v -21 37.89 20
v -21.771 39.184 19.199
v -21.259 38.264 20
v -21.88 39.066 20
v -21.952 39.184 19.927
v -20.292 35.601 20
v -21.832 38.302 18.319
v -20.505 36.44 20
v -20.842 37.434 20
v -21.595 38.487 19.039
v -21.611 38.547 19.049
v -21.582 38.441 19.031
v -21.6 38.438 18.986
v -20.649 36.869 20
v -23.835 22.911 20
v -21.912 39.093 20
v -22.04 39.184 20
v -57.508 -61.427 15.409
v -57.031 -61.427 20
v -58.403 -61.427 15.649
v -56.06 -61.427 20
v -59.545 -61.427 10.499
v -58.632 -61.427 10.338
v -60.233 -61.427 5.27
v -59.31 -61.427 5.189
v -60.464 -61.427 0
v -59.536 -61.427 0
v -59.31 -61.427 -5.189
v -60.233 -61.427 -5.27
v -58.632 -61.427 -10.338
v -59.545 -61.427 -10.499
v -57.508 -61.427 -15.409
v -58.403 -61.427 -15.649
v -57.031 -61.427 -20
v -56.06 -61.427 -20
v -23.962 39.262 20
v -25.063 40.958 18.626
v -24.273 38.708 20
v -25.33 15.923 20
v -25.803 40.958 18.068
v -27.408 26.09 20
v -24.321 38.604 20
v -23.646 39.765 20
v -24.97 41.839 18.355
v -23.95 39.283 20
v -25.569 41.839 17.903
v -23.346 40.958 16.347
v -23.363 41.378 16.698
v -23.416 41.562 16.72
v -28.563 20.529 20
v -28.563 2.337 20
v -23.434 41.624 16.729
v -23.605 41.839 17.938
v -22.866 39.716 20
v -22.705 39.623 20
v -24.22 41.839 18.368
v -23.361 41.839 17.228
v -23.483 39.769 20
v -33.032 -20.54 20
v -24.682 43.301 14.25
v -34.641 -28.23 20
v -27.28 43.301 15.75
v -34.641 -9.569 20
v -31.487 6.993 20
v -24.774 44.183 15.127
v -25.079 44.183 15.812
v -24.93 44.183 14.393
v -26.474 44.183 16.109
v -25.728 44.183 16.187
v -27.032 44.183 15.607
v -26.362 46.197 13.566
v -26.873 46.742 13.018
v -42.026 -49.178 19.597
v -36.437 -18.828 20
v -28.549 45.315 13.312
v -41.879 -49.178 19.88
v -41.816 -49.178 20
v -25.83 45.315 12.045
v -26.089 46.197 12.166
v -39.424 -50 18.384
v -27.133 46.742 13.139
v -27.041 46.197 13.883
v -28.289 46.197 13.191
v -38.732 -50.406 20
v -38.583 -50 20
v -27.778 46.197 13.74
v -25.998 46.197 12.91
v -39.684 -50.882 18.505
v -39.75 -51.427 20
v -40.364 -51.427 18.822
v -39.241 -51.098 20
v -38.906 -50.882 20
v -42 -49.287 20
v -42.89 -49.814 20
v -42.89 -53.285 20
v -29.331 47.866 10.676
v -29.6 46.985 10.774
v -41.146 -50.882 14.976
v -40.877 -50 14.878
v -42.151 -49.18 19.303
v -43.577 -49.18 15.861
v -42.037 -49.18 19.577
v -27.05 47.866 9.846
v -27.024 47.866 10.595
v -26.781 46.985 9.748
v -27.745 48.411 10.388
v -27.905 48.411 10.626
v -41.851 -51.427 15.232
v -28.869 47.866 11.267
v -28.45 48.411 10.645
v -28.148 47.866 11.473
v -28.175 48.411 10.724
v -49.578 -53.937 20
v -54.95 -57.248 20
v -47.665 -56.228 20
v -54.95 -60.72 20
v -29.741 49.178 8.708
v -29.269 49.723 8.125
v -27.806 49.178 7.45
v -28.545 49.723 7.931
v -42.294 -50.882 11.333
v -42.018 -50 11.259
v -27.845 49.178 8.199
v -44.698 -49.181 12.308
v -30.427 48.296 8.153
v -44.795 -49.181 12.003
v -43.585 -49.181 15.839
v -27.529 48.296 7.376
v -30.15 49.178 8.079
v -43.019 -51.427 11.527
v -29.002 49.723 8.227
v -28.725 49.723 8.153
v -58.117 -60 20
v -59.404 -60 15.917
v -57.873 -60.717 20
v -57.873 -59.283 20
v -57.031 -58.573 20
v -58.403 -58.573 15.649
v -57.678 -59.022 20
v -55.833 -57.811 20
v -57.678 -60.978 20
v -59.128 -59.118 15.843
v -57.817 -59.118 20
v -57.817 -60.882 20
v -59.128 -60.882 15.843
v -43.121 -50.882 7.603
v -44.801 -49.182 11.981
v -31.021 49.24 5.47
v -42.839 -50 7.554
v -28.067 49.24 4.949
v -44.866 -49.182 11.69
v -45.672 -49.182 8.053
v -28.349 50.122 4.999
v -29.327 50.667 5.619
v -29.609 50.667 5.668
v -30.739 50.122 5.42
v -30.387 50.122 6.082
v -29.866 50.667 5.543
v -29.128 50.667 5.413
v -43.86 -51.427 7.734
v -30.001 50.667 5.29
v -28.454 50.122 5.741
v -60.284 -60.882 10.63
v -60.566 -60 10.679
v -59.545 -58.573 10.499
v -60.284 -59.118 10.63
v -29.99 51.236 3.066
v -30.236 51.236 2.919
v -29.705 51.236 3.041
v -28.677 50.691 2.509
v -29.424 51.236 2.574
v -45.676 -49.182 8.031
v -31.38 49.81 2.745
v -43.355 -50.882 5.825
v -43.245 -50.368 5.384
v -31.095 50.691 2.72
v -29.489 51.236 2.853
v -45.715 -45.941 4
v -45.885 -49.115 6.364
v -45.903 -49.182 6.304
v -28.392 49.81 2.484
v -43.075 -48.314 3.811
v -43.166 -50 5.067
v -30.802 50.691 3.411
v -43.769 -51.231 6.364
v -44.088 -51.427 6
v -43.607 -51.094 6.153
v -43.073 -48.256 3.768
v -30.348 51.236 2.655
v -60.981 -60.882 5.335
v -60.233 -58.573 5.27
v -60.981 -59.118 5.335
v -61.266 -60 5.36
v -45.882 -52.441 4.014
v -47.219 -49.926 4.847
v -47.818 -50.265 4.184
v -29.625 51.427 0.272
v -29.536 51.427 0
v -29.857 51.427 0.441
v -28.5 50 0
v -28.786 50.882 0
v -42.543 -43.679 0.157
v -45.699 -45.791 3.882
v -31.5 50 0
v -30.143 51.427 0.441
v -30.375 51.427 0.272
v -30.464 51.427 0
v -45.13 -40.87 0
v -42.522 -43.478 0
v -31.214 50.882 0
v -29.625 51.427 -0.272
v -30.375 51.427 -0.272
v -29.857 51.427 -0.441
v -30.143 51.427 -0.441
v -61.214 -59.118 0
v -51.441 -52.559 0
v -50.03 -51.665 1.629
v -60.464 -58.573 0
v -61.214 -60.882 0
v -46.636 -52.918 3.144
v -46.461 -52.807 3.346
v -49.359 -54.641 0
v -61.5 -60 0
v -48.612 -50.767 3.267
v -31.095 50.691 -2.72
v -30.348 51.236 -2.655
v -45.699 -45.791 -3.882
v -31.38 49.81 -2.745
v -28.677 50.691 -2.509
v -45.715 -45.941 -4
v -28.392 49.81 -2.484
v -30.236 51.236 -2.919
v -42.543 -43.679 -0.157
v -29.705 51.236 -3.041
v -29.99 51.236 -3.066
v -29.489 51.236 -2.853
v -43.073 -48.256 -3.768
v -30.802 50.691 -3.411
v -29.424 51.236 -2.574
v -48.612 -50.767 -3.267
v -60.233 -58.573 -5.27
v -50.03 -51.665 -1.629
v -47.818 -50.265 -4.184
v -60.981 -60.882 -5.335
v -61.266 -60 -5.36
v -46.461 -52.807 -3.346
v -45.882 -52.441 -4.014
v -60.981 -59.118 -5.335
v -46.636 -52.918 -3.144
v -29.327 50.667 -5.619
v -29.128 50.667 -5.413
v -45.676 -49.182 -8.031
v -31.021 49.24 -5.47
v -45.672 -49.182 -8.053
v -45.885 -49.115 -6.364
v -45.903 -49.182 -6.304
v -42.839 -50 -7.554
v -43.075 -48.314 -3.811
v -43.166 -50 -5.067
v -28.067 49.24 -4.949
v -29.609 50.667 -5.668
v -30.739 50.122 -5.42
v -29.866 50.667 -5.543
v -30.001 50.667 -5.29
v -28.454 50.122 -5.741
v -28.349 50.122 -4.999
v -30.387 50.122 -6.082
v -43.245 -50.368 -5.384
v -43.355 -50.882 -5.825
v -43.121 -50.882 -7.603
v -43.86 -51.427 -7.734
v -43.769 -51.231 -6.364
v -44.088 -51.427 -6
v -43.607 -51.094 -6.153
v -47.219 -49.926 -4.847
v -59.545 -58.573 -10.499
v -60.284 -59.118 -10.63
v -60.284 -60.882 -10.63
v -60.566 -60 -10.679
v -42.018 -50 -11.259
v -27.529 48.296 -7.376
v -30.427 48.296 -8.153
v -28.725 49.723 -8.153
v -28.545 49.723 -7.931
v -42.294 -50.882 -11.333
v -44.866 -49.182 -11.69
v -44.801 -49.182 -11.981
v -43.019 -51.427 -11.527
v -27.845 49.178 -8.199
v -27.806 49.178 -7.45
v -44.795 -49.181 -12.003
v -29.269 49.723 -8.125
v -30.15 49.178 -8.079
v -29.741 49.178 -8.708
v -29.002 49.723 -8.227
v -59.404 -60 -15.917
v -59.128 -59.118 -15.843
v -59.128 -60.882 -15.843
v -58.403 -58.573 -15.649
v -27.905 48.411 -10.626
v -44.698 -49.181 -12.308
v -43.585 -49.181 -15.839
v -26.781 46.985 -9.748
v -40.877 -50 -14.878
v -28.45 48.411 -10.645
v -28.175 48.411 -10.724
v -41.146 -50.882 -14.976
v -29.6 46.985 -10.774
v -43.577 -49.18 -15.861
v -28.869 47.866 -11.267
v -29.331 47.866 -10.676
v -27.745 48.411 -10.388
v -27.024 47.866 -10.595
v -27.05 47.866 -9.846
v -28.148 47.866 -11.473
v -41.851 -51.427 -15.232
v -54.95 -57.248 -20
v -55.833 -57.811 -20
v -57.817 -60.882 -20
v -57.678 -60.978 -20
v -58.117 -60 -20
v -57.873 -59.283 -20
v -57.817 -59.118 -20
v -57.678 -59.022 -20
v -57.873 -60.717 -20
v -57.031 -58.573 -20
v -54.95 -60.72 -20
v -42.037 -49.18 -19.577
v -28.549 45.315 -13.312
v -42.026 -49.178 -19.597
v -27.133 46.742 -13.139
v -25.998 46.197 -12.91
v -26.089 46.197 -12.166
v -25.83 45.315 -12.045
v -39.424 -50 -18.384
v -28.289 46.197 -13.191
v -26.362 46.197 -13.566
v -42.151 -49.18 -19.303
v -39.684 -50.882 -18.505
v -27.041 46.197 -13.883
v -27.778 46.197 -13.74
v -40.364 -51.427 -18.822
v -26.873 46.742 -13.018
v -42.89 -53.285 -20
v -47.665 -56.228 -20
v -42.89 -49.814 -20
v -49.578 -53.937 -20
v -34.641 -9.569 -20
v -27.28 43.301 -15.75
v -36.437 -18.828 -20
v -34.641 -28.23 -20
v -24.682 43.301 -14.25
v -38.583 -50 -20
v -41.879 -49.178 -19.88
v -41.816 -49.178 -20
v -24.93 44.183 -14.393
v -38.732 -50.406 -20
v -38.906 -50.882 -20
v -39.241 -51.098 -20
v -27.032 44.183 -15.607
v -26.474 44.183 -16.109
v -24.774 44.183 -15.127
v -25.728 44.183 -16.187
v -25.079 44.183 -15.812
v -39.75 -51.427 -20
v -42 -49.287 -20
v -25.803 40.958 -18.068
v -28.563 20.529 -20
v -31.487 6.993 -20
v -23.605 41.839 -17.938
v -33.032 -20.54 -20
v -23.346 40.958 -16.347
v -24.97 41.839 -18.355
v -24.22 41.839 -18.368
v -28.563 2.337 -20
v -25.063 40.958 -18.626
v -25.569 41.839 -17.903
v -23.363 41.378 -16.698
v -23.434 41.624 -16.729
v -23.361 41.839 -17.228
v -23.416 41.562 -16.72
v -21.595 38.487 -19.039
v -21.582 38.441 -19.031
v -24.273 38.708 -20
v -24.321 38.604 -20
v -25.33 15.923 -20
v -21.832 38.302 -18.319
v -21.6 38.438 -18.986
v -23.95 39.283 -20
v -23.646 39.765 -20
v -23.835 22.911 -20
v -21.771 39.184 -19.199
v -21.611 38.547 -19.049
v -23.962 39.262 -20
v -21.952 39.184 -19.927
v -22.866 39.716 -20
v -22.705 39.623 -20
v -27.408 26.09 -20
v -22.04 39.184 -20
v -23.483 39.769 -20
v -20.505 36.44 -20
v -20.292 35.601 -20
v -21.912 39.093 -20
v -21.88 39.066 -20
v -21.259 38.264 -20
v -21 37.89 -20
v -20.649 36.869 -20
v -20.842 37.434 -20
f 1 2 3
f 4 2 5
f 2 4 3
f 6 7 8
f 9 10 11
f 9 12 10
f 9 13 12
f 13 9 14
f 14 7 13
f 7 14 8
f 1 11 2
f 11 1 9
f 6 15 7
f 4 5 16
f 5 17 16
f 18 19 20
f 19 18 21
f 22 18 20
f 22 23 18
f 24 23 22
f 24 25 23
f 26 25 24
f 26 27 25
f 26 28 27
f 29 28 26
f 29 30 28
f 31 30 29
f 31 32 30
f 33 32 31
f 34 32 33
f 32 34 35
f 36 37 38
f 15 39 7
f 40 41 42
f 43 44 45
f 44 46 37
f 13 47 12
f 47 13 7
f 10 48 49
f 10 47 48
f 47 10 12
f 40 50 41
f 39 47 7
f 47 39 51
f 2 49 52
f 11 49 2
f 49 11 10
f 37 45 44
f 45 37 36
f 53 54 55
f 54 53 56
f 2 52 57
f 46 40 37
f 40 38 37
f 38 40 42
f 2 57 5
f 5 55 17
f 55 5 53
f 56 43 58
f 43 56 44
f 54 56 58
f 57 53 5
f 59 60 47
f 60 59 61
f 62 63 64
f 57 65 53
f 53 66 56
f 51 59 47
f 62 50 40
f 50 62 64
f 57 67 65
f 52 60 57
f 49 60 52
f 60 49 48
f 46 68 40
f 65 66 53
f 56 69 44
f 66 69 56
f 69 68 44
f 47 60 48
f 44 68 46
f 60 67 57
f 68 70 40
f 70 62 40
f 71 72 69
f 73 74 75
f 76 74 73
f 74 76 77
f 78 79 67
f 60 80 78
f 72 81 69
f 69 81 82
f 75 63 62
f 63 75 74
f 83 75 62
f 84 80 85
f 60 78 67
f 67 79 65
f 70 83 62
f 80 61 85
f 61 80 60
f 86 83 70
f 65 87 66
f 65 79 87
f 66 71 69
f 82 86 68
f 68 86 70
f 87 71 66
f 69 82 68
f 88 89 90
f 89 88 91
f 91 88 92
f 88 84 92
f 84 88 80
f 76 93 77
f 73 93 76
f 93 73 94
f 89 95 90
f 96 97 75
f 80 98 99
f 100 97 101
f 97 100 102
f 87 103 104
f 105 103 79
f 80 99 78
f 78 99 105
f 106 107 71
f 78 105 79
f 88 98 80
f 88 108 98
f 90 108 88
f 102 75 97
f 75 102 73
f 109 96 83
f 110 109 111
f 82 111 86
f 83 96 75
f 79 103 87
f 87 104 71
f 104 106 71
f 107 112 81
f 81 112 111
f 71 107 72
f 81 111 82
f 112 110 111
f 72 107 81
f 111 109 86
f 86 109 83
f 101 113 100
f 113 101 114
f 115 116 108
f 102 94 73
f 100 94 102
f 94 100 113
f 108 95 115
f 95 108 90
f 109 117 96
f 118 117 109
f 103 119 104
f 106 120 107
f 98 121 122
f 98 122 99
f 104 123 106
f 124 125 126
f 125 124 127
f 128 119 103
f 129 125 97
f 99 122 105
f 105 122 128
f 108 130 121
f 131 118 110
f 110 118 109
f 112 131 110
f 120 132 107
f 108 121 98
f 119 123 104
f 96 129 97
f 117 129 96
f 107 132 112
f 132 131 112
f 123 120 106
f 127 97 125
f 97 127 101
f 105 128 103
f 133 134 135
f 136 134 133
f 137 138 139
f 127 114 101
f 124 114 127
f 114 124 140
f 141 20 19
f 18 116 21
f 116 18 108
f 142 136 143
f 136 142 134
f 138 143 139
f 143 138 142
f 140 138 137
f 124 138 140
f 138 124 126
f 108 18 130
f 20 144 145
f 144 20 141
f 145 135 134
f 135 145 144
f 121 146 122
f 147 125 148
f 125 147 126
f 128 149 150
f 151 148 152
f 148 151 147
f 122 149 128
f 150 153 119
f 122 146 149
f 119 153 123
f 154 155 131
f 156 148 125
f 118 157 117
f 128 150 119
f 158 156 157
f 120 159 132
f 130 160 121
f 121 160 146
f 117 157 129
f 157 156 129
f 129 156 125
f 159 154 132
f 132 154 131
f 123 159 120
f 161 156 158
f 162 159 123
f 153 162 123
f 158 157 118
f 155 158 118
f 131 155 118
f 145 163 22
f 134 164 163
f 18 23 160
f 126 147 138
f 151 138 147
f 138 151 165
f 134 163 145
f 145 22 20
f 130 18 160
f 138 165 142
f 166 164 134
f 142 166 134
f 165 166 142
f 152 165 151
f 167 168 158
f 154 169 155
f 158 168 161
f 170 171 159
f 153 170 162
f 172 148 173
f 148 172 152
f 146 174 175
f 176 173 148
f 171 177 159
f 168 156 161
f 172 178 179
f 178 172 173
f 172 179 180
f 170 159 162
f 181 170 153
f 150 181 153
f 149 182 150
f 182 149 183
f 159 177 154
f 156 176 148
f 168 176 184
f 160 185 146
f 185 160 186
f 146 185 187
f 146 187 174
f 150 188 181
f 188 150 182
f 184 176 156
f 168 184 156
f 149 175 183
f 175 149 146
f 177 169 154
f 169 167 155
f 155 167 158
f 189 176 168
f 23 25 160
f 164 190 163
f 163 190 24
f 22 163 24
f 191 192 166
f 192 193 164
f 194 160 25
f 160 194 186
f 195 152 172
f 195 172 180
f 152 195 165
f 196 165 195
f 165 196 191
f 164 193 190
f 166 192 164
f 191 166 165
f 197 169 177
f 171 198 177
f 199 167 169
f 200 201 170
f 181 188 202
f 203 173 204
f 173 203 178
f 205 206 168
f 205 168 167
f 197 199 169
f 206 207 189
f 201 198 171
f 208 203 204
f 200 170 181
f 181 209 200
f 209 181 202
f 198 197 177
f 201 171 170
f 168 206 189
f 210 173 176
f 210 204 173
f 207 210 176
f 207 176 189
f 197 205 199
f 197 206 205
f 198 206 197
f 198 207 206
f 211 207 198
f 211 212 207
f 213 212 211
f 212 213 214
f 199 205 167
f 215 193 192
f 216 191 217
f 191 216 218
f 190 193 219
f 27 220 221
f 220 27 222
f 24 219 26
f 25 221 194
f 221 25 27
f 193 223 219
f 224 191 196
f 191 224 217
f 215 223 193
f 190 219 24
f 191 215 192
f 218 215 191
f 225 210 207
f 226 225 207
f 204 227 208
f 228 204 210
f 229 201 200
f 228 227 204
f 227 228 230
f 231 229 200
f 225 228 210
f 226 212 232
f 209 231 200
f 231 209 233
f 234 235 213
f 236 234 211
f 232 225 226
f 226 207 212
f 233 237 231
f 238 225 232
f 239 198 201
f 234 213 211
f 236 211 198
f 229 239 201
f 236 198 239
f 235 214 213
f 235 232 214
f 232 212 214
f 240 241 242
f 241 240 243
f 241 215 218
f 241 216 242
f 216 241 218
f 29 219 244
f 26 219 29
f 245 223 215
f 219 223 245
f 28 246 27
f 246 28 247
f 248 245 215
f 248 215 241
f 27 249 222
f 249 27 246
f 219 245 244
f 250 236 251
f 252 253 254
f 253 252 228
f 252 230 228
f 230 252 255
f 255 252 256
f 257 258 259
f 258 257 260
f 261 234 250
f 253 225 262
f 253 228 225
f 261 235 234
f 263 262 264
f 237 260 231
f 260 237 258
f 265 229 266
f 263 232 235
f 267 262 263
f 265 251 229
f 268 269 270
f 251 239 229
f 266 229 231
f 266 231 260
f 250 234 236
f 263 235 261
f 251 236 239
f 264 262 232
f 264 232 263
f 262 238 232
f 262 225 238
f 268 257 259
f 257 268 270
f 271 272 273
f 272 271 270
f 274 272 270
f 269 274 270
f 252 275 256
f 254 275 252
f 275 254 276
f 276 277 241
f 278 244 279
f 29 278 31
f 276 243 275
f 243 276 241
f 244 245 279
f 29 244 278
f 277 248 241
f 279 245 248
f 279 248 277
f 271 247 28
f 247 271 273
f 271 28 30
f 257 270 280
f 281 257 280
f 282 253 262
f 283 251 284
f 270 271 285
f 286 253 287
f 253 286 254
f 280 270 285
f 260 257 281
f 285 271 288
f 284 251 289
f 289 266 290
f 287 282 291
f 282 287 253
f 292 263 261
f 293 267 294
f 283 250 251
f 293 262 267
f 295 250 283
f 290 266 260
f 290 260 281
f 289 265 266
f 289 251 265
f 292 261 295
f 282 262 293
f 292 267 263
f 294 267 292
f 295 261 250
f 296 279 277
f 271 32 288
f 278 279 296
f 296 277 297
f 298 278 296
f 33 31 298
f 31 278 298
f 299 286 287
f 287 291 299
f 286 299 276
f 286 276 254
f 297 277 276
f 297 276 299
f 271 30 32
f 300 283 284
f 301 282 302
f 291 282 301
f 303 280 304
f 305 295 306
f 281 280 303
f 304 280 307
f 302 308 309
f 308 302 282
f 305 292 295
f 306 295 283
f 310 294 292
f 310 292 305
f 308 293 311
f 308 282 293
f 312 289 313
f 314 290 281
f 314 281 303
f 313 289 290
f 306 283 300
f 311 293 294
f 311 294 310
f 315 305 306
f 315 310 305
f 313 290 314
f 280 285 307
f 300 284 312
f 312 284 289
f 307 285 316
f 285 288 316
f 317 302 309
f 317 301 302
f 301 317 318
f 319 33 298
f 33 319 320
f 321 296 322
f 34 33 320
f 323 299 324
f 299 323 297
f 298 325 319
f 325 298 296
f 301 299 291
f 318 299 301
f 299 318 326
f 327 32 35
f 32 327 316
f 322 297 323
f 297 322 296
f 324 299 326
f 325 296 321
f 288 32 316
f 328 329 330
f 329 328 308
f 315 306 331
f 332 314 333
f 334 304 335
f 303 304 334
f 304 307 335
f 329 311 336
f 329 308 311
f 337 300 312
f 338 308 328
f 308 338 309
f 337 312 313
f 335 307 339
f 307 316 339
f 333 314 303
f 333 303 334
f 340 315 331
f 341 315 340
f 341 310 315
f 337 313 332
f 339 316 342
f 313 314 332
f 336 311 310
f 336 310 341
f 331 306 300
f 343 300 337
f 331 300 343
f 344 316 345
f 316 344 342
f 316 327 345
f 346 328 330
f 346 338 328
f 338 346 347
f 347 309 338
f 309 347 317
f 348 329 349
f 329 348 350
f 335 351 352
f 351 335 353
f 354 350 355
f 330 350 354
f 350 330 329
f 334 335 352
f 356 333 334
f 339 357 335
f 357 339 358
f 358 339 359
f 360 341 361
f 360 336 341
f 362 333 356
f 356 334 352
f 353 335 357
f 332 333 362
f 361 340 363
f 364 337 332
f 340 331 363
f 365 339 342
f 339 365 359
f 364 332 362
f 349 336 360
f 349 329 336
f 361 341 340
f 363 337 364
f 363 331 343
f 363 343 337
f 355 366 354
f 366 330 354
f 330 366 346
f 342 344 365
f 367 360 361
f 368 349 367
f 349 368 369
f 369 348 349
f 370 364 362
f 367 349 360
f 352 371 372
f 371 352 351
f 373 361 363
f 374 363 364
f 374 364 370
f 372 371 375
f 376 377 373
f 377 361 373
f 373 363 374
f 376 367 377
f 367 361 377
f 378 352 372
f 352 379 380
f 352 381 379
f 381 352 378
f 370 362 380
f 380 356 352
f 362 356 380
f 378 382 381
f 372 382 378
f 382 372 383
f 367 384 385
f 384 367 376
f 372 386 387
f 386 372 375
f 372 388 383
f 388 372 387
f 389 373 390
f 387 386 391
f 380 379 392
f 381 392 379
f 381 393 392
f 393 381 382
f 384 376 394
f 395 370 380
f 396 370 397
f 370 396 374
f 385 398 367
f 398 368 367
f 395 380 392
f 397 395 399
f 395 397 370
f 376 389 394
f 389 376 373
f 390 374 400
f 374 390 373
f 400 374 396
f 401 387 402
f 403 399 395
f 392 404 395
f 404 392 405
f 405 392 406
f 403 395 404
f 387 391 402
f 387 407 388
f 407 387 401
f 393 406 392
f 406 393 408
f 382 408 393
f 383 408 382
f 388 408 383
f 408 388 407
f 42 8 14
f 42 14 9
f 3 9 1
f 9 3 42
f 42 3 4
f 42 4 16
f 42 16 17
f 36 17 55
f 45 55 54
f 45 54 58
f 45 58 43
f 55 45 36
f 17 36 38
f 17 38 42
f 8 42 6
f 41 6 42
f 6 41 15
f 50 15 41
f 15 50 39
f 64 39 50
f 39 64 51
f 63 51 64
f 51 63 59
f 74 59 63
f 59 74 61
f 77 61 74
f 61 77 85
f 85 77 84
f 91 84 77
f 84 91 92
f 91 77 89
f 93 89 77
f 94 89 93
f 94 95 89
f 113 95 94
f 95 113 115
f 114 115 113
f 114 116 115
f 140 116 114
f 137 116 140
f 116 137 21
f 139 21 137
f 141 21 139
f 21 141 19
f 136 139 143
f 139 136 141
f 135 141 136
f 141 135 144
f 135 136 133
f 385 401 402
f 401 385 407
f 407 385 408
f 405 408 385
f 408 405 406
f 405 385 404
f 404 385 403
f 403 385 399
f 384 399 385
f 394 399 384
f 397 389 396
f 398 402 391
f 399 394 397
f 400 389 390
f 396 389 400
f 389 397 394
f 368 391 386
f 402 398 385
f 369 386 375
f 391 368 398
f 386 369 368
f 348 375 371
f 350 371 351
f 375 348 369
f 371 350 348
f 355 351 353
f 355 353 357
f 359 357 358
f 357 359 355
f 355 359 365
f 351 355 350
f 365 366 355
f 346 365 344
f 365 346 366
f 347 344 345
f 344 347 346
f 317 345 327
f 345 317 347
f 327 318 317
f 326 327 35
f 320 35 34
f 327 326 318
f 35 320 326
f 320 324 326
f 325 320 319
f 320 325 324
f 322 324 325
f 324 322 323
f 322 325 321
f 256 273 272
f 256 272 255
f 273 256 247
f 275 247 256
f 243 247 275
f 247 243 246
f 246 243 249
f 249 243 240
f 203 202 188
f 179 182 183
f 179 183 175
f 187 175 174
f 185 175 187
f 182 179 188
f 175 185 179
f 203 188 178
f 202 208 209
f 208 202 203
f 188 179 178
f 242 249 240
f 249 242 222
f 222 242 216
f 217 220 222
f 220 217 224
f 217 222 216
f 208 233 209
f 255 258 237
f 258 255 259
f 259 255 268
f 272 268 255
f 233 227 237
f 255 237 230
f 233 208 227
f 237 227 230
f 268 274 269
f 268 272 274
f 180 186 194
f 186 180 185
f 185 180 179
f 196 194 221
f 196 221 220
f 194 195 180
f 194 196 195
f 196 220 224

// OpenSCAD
//Length of the shoe horns straight part in mm
height=100; 

//Thickness of the shoe horn in mm
thick=3;

//Diameter of the hole to hang it
holesize=9;

//Radius of the circle for the main curvature at the end of the shoe horn
rad=30;

//Radius multiplier for the middle part of the shoe horn (make it flatter in the middle)
rad_multiplier1=1.5;

//Radius multiplier for the top end (make it even flatter and move it further out)
rad_multiplier2=2;

//How many degree from one face of the curvature to the next (bigger for faster rendering)
angle_step=5;

//Faces for the rounding at the ends of the shoe horn
faces=10;

// preview[view:left, tilt:side]

/* [Hidden] */

/*
Shoe Horn
Version C, November 2014
Written by MC Geisler (mcgenki at gmail dot com)

This is the baby sized version... Customize it to suit a yeti.

Have fun!

License: Attribution-NonCommercial-ShareAlike 4.0 International (CC BY-NC-SA 4.0)
You are free to:
    Share - copy and redistribute the material in any medium or format
    Adapt - remix, transform, and build upon the material
Under the following terms:
    Attribution - You must give appropriate credit, provide a link to the license, and indicate if changes were made. 
    You may do so in any reasonable manner, but not in any way that suggests the licensor endorses you or your use.
    NonCommercial - You may not use the material for commercial purposes.
    ShareAlike - If you remix, transform, or build upon the material, you must distribute your contributions under the same license as the original. 
*/

width=rad*1.4;

module stickballs(rot,low_z,high_z,low_r,high_r,round_low)
{
	rotate([0,0,rot])
		{
			translate([-low_r,0,low_z+(1-cos(rot))*round_low])
				sphere(r=thick/2,center=true,$fn=faces);

			translate([-high_r,0,high_z])
				sphere(r=thick/2,center=true,$fn=faces);
		}
}

//lower part
module stickballslong(rot)
{
	stickballs(rot,-height/2,height/2,rad,rad*rad_multiplier1,height/2);
}

//upper part
module stickballsshort(rot)
{
	stickballs(rot,height/2,height/2+height*.1,rad*rad_multiplier1,rad*rad_multiplier2,0);
}

module shoehorn(length)
{
	angle=45;

	cutsize=max(length,thick,rad,width)*2+2*rad;
	difference()
	{
		union()
		{
			for(i=[-angle:angle_step:angle-angle_step])
			{
				hull()
				{
					stickballslong(i);
					stickballslong(i+angle_step);
				}
				hull()
				{
					stickballsshort(i);
					stickballsshort(i+angle_step);
				}
			}
		}
		translate([0,cutsize/2+width/2,0])
			cube(cutsize+2,center=true);
		translate([0,-(cutsize/2+width/2),0])
			cube(cutsize+2,center=true);
		translate([-rad*rad_multiplier1,0,height/2])
			rotate([0,45,0])
				rotate([0,0,45])
					cube([holesize,holesize,thick*50],center=true);
	}
}

rotate([90,0,0])
	shoehorn(height);

